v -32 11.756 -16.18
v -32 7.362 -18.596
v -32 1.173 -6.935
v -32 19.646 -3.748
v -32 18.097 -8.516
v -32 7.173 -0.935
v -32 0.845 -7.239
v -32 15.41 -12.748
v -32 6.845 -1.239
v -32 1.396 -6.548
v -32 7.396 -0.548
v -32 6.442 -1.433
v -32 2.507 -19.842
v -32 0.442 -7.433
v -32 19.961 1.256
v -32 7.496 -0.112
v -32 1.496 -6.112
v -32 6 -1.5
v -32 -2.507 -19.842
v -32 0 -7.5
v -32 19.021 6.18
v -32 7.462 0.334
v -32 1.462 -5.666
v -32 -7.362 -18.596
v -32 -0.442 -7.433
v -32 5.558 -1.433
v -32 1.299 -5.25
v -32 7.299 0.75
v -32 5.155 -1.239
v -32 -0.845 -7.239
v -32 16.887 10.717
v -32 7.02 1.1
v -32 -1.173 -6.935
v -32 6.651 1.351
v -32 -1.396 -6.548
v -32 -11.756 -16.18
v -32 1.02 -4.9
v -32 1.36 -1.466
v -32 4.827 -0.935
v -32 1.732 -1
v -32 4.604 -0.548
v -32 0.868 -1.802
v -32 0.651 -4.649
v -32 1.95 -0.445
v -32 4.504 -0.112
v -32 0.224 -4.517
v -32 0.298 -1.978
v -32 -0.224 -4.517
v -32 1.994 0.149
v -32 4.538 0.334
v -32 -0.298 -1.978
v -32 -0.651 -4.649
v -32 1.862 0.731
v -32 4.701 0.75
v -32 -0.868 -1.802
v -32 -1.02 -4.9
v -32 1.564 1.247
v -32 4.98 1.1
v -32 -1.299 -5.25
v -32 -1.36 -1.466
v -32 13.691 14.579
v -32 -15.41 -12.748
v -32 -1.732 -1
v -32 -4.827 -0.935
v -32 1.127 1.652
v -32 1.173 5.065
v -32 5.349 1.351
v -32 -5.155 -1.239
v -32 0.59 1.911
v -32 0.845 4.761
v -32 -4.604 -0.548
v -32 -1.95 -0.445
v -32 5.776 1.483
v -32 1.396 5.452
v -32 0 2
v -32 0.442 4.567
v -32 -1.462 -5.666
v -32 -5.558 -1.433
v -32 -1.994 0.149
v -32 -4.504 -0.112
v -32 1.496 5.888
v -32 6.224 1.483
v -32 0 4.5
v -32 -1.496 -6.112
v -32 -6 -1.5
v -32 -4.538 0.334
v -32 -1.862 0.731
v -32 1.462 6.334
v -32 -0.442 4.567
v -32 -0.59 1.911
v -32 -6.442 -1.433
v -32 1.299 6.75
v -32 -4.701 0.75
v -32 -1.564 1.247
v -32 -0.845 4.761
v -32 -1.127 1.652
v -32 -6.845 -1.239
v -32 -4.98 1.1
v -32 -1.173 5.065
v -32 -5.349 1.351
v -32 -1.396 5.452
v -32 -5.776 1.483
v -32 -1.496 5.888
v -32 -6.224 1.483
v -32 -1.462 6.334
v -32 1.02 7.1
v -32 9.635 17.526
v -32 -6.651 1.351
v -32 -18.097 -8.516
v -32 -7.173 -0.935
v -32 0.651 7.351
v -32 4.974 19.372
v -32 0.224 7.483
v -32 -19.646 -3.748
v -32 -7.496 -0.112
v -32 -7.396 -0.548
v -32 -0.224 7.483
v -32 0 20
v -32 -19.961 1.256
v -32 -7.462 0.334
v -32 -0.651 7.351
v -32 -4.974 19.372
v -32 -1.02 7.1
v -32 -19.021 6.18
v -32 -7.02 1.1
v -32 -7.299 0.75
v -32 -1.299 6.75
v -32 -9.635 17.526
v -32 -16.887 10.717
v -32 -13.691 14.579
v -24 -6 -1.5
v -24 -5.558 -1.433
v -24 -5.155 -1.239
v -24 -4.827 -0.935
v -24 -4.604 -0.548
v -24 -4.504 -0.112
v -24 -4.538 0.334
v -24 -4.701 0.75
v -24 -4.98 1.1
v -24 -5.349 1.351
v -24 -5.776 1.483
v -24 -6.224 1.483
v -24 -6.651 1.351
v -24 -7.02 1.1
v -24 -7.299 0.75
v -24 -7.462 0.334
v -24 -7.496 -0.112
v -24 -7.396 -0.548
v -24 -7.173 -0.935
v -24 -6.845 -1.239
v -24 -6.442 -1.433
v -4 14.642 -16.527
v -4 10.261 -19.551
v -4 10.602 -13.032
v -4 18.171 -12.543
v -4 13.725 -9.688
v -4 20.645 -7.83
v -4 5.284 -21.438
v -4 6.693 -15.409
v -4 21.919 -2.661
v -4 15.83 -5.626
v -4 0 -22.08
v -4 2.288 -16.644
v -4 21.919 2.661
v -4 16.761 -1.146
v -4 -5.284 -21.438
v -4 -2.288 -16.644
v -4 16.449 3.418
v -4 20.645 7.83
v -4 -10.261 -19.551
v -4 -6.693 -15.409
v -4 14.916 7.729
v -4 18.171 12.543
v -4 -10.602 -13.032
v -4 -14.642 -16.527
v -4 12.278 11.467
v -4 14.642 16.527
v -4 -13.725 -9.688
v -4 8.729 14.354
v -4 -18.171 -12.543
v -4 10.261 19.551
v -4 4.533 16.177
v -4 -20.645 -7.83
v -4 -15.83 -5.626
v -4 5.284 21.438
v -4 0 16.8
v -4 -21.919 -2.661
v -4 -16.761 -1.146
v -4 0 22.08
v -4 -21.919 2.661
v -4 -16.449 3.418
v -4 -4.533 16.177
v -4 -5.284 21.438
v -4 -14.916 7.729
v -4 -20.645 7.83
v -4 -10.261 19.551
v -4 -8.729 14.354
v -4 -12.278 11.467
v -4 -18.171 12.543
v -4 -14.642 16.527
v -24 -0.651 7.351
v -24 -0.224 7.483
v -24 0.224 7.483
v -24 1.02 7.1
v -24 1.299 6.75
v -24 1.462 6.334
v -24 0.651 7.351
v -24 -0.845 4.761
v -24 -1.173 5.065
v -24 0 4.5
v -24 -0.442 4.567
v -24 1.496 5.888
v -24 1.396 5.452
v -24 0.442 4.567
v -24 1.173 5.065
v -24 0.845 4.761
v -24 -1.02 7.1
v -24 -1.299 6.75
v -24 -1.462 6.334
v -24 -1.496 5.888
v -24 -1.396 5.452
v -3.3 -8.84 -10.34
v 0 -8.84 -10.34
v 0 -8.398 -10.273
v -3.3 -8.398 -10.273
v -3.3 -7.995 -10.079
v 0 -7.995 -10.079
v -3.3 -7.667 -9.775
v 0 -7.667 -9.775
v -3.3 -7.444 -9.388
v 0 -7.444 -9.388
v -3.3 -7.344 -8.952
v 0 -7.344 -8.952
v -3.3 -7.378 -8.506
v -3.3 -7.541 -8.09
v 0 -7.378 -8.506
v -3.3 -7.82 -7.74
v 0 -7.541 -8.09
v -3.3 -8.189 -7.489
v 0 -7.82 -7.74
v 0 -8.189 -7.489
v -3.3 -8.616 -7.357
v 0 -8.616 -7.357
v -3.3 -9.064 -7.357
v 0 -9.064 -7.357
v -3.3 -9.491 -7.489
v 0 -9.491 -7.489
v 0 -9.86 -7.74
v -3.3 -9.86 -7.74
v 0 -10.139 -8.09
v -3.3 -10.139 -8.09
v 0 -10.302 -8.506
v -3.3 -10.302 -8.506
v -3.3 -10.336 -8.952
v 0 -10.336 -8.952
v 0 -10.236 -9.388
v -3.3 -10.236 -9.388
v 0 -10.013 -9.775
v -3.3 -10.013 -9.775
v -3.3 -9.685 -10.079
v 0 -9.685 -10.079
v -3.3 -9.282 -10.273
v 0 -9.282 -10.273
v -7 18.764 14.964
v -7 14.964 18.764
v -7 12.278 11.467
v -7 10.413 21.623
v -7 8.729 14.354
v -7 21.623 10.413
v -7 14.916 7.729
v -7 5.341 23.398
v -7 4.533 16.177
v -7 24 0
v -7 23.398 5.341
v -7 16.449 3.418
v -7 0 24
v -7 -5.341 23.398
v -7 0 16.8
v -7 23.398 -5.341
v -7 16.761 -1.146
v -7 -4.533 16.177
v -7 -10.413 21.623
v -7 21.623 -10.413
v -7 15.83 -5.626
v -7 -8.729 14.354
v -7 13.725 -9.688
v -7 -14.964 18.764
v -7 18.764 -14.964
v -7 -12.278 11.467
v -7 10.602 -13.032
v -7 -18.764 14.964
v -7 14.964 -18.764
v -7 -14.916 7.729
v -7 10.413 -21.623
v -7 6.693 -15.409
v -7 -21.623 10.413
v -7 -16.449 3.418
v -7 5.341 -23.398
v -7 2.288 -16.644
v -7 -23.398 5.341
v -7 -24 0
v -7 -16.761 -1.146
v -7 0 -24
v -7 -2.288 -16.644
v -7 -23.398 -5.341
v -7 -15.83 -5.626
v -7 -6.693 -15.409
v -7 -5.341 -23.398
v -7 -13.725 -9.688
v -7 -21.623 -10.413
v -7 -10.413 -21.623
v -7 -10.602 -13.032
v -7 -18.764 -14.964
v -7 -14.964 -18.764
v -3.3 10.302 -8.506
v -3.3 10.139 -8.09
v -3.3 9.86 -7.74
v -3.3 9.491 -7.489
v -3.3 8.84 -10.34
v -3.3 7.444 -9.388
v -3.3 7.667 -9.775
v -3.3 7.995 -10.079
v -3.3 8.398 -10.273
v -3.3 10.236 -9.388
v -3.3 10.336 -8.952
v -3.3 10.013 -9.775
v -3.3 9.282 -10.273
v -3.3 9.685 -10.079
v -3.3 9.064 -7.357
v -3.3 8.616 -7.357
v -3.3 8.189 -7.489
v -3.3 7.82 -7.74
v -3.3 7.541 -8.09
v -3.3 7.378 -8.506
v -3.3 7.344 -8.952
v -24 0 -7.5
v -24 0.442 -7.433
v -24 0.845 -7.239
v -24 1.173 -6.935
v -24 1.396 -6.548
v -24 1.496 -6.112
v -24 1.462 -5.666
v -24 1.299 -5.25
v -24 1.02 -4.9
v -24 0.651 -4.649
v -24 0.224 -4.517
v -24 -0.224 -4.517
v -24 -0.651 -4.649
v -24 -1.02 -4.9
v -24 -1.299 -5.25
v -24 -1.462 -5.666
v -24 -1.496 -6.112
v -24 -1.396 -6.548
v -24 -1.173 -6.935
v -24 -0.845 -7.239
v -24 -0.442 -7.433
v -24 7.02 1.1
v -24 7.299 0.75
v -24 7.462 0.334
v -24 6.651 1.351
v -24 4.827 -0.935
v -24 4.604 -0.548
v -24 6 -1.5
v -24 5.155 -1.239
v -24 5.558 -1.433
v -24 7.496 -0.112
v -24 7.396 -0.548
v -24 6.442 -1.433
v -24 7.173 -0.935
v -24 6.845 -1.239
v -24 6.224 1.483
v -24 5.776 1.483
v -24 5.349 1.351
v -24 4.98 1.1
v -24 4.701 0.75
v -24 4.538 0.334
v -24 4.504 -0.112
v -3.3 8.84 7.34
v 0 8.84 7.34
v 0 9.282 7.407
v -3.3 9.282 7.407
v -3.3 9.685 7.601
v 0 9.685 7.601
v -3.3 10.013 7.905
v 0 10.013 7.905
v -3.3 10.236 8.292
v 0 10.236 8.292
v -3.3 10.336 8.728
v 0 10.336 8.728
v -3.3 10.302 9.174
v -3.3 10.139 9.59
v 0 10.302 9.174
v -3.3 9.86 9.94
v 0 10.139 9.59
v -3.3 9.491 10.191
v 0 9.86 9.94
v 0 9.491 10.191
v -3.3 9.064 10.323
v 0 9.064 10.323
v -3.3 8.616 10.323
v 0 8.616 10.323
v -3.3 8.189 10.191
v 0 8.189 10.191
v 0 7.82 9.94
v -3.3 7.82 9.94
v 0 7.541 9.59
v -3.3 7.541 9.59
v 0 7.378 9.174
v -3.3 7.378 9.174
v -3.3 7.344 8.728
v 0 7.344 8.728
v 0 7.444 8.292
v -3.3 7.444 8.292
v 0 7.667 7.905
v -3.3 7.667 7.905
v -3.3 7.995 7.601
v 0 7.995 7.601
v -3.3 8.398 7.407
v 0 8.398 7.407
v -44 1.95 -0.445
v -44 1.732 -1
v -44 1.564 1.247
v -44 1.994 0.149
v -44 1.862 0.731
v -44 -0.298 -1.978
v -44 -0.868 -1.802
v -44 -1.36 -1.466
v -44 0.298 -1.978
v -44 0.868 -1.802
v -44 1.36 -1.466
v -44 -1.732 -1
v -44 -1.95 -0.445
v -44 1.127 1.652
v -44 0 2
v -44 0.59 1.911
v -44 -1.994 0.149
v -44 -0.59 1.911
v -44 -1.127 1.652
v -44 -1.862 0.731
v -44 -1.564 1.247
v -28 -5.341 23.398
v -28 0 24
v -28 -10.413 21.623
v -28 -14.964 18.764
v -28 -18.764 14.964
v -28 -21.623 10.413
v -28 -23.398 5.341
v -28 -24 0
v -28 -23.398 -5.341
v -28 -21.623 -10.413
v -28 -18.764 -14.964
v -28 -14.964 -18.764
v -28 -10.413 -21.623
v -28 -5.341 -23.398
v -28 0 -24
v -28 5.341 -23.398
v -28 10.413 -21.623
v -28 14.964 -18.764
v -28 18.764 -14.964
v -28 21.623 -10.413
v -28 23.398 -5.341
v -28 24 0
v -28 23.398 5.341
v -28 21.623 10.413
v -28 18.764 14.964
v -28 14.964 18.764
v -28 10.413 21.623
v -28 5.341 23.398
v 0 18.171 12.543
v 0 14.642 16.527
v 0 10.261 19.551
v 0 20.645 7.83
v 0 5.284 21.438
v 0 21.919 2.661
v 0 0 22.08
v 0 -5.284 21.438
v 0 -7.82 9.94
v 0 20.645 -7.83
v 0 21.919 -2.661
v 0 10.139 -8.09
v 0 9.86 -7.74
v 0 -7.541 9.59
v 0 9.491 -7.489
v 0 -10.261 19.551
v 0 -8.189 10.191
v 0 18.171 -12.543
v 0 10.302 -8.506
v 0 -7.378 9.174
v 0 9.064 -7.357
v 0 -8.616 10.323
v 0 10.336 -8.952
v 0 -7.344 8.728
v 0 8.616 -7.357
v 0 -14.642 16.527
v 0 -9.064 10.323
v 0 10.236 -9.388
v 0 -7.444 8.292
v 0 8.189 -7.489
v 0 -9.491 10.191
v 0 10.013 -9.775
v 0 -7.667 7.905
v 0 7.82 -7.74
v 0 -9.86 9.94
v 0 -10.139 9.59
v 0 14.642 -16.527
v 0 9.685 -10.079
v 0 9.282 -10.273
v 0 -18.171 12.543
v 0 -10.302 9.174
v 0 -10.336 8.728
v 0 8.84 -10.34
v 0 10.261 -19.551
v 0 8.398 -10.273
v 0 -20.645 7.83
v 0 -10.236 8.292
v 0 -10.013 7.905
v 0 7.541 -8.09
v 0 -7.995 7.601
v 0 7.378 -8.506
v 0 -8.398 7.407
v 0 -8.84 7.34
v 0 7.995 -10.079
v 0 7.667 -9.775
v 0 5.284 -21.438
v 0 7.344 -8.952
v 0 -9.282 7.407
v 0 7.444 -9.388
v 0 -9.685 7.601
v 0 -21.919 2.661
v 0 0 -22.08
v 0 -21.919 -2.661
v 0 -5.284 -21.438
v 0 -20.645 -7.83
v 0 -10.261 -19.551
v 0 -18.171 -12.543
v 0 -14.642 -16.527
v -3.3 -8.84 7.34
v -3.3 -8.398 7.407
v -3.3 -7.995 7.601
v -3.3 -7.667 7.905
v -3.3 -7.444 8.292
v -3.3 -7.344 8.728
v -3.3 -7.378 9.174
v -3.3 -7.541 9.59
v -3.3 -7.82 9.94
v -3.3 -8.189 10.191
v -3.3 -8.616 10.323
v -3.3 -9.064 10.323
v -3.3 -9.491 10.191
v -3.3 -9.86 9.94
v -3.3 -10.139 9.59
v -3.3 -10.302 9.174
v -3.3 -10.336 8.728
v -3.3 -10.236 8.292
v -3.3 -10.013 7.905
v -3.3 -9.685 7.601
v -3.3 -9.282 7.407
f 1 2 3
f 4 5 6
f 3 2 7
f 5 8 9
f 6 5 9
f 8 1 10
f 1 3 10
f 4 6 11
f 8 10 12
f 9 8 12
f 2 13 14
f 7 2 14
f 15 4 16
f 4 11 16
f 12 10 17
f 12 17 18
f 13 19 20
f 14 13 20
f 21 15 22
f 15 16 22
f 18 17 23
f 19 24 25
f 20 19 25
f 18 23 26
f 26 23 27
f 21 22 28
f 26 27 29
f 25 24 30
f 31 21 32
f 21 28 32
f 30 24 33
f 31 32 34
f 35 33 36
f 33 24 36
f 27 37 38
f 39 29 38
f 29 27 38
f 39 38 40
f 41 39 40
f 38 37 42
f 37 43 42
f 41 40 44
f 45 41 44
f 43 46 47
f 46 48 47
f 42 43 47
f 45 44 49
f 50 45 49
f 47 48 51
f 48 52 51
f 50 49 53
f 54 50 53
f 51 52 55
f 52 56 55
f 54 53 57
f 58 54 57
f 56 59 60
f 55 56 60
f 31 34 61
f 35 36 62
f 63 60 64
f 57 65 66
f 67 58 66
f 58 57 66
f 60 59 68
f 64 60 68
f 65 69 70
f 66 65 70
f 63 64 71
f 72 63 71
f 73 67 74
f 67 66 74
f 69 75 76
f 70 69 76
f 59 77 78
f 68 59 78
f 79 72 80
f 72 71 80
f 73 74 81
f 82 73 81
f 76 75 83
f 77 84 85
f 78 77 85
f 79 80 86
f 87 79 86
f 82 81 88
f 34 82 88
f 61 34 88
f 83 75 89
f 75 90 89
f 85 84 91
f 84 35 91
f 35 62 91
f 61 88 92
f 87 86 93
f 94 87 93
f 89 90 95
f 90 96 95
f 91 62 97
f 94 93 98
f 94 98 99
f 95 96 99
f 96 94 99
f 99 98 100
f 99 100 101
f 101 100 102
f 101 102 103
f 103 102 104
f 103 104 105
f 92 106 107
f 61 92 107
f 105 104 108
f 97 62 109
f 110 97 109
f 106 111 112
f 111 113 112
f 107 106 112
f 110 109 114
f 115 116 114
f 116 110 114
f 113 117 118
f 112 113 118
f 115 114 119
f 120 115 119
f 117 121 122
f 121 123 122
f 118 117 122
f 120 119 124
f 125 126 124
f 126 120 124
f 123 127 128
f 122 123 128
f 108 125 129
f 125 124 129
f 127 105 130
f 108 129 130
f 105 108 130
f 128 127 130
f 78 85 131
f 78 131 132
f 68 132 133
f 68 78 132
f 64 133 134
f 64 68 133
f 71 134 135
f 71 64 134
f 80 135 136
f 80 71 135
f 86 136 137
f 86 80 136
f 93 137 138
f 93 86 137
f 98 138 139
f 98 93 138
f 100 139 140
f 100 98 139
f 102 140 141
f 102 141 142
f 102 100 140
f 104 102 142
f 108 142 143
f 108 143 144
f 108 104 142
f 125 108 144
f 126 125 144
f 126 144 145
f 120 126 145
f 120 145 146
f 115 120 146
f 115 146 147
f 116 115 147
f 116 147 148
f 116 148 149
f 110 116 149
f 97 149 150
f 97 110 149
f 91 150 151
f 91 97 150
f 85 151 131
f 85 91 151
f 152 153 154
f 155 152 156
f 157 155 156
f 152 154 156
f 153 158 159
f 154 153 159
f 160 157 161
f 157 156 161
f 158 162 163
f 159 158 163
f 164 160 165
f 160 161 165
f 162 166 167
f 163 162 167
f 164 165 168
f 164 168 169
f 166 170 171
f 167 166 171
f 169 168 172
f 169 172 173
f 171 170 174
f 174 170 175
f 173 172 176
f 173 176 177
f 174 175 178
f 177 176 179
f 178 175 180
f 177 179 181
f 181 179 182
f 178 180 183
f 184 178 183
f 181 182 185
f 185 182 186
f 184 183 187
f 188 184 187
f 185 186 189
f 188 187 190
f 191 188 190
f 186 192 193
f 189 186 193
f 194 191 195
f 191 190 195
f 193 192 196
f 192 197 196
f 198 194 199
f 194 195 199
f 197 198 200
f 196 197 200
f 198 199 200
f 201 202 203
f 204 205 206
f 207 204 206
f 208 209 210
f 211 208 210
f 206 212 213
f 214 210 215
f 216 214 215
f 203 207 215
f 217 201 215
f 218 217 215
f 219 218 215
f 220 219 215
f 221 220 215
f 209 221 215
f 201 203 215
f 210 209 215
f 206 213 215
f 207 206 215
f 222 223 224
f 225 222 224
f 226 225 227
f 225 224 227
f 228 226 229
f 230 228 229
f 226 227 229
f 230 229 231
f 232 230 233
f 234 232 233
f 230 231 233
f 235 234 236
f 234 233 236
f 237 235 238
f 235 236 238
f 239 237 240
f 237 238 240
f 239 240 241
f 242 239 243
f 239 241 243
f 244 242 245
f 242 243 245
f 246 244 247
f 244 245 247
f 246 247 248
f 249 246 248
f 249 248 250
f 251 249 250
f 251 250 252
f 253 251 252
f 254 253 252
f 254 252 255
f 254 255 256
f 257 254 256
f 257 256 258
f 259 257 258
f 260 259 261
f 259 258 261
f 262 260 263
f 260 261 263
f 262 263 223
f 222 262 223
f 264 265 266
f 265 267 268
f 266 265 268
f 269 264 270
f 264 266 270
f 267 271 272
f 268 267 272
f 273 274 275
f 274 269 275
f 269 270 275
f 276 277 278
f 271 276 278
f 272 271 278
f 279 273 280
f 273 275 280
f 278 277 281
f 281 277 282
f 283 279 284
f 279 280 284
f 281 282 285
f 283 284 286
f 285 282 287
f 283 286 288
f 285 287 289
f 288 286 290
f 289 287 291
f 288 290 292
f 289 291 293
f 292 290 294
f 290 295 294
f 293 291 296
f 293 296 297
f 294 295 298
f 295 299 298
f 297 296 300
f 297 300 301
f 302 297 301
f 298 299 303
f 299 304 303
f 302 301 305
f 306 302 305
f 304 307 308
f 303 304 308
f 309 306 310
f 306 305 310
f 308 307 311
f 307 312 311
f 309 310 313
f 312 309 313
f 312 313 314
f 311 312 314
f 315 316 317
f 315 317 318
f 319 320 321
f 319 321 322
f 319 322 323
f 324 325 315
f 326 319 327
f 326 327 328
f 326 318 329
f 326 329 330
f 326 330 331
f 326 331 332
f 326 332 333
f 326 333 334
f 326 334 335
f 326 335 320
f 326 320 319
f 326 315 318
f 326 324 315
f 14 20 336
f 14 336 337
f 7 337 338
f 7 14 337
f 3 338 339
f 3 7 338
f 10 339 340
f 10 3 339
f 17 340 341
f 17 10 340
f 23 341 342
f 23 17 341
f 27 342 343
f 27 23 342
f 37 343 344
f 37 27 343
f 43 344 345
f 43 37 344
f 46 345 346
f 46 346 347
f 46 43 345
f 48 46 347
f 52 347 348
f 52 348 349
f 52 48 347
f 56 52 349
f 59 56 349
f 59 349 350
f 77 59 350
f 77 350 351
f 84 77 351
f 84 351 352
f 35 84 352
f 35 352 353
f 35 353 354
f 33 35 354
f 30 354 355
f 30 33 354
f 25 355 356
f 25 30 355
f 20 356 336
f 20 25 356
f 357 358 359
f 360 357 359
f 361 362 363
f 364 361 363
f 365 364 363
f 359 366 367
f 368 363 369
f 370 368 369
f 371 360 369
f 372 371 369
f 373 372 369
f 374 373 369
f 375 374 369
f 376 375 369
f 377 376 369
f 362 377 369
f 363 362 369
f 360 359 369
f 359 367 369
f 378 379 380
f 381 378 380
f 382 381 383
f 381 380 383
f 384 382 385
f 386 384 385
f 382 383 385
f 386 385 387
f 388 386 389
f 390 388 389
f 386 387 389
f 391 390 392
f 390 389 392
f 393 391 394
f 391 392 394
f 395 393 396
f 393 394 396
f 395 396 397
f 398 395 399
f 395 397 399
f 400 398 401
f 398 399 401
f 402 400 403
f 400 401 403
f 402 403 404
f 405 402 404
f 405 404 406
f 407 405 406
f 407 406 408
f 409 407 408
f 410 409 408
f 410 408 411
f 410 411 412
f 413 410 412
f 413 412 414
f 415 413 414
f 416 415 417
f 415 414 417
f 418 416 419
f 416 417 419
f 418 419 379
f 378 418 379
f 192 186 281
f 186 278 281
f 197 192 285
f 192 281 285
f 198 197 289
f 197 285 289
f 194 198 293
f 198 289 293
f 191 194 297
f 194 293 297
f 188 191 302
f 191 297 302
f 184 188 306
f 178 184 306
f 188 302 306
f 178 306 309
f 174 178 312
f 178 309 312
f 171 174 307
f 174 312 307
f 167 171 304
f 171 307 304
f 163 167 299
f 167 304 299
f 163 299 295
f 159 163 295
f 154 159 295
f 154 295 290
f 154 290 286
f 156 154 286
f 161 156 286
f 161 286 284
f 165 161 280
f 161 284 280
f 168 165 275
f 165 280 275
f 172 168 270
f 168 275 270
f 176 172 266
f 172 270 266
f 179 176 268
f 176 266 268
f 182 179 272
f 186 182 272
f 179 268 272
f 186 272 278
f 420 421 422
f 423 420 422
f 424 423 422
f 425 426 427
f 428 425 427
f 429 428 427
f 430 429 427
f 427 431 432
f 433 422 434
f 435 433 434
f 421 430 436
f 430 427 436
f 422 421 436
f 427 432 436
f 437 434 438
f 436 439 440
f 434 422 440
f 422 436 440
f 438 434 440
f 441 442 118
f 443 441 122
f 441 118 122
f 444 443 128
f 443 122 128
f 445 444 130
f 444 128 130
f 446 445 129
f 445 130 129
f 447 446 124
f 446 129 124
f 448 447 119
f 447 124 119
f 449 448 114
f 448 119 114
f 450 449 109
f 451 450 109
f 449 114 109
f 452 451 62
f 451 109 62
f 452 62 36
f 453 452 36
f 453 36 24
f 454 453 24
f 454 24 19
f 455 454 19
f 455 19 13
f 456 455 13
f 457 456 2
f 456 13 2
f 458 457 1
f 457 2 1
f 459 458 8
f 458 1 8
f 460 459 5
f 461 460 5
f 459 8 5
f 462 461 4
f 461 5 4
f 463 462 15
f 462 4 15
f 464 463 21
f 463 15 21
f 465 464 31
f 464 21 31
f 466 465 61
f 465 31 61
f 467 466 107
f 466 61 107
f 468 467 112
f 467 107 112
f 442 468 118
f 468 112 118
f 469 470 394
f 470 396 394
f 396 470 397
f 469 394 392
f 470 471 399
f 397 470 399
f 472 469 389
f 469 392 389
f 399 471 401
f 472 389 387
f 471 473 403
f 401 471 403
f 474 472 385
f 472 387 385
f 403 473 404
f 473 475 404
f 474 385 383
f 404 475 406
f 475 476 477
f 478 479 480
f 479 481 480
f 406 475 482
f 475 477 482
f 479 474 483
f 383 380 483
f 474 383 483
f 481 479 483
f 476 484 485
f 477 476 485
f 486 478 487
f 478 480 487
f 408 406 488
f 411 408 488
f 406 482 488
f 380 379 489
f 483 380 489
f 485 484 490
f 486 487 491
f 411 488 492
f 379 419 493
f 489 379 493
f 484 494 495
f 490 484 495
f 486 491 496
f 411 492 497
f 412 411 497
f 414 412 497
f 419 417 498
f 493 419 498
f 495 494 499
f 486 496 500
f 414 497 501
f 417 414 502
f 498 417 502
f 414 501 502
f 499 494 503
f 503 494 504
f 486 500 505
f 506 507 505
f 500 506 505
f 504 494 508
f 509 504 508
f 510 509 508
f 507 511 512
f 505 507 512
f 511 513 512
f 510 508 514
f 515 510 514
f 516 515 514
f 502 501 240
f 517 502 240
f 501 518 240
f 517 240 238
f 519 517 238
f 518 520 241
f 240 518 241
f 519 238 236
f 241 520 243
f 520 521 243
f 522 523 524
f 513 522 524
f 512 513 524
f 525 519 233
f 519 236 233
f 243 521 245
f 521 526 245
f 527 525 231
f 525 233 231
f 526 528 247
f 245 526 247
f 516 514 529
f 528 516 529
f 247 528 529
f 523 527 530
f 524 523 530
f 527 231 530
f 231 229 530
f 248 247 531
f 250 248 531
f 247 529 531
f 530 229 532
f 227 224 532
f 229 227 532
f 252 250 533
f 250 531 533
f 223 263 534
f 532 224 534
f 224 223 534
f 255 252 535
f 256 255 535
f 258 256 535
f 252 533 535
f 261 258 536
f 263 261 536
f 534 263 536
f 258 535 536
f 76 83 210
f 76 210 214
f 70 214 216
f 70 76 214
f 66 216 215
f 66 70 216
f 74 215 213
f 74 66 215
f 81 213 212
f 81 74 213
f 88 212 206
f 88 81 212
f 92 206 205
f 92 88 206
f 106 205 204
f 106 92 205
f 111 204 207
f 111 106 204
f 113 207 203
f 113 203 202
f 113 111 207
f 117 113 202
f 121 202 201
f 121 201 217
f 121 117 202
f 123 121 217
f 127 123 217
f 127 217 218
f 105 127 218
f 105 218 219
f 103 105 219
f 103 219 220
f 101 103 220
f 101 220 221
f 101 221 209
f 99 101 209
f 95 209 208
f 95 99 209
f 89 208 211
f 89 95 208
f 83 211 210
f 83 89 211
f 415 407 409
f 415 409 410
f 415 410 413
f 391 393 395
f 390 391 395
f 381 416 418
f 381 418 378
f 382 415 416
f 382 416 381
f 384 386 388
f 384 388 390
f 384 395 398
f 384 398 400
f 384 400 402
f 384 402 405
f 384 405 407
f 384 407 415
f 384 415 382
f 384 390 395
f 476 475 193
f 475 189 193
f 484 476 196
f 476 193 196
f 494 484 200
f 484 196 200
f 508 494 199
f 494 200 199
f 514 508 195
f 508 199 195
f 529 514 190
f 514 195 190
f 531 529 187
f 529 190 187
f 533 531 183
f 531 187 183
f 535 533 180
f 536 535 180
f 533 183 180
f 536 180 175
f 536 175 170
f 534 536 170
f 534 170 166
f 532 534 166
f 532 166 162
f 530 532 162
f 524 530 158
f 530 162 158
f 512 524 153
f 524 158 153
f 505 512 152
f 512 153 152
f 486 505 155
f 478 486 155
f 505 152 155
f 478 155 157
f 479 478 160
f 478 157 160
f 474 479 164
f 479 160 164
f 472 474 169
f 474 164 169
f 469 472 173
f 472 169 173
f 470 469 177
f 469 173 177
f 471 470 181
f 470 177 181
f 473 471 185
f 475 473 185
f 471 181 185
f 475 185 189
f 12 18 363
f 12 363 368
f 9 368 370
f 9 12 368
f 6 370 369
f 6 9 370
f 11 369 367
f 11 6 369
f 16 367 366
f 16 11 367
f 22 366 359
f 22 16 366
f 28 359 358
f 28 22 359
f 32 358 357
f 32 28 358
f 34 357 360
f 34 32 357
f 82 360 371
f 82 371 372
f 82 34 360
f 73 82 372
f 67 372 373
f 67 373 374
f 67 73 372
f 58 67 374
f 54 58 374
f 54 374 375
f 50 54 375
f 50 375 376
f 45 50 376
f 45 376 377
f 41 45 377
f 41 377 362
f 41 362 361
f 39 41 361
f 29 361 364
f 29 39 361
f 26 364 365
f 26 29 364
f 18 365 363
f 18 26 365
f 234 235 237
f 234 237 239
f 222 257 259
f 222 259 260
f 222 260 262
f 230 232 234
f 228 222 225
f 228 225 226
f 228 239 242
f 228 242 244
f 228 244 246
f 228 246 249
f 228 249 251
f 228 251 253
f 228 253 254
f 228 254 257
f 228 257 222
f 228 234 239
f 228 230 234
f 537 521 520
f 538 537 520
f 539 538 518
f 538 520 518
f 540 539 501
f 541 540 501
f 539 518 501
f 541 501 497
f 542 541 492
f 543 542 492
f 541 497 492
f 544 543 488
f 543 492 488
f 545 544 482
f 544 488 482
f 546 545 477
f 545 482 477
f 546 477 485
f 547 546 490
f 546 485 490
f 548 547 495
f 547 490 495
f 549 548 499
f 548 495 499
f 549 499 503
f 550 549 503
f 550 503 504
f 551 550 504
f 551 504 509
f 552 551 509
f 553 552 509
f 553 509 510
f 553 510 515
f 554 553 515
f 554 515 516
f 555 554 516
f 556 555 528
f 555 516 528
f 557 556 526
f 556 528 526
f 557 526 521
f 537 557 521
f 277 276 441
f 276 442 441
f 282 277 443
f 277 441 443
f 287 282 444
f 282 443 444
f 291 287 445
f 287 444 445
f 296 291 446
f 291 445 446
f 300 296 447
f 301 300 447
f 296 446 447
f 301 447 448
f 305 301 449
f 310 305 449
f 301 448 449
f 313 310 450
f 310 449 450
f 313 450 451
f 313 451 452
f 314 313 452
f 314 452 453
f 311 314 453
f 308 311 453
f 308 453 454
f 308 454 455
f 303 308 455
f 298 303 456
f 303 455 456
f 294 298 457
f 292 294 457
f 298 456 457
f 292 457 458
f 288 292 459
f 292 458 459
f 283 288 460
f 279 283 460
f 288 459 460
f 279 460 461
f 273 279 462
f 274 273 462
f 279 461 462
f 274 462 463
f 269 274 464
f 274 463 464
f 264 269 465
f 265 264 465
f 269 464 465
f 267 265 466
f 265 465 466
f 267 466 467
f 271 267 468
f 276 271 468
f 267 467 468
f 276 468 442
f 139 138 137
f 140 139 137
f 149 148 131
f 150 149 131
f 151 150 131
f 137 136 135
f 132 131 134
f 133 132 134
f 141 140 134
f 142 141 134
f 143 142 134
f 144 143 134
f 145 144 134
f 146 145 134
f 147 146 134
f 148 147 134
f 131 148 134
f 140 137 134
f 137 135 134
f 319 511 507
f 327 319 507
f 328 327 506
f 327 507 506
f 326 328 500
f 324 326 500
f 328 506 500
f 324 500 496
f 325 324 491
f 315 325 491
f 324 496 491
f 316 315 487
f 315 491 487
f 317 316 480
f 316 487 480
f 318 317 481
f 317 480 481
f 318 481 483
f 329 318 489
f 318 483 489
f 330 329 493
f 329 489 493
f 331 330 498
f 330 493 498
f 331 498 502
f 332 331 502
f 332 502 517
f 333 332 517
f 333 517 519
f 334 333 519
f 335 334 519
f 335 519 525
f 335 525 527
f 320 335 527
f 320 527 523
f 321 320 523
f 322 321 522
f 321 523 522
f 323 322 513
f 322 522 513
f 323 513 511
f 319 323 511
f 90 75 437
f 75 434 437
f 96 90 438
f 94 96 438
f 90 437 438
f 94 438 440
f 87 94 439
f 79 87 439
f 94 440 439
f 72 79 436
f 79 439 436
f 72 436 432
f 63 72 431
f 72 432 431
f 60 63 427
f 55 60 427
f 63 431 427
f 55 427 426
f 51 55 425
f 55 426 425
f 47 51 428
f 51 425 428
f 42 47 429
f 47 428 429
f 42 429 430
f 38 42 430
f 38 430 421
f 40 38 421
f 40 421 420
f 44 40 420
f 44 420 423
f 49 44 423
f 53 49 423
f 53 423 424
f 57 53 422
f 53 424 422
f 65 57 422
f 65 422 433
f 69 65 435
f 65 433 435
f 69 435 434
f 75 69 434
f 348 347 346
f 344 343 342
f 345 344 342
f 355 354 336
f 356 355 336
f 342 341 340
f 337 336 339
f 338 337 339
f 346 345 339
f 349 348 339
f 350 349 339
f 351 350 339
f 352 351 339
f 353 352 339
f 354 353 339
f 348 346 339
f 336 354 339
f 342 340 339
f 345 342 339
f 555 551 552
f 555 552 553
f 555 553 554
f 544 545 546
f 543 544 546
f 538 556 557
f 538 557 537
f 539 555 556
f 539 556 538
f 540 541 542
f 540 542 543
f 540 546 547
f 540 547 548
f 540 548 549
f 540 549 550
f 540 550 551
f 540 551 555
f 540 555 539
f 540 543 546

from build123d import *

# Parameters (mm, degrees)
SKETCH2_R          = 1.5
CUT_EXTRUDE1_DEPTH = 3.3
SKETCH3_R          = 1.5
CUT_EXTRUDE2_DEPTH = 8


with BuildPart() as part:
    # Sketch1 → Revolve1 (revolve)
    with BuildSketch(Plane.XY, mode=Mode.PRIVATE) as revolve1_sk:
        Polygon((0, 0), (0, 22.08), (-4, 22.08), (-4, 16.8), (-7, 16.8), (-7, 24), (-28, 24), (-32, 20), (-32, 2), (-44, 2), (-44, 0), align=None)
    revolve(revolve1_sk.sketch.rotate(Axis((-10, 0, 0), (1, 0, 0)), 90), axis=Axis((-10, 0, 0), (1, 0, 0)))

    # Sketch2 → Cut-Extrude1 (cut)
    with BuildSketch(Plane(origin=(0, 0, 0), x_dir=(0, 0, -1), z_dir=(1, 0, 0))):
        with Locations((-8.84, 8.84)):
            Circle(SKETCH2_R)
        with Locations((-8.84, -8.84)):
            Circle(SKETCH2_R)
        with Locations((8.84, 8.84)):
            Circle(SKETCH2_R)
        with Locations((8.84, -8.84)):
            Circle(SKETCH2_R)
    extrude(amount=-CUT_EXTRUDE1_DEPTH, mode=Mode.SUBTRACT)

    # Sketch3 → Cut-Extrude2 (cut)
    with BuildSketch(Plane(origin=(-32, 0, 0), x_dir=(0, 0, -1), z_dir=(1, 0, 0))):
        with Locations((-6, 0)):
            Circle(SKETCH3_R)
        with Locations((6, 0)):
            Circle(SKETCH3_R)
        with Locations((0, 6)):
            Circle(SKETCH3_R)
        with Locations((0, -6)):
            Circle(SKETCH3_R)
    extrude(amount=CUT_EXTRUDE2_DEPTH, mode=Mode.SUBTRACT)


solid = part.part
